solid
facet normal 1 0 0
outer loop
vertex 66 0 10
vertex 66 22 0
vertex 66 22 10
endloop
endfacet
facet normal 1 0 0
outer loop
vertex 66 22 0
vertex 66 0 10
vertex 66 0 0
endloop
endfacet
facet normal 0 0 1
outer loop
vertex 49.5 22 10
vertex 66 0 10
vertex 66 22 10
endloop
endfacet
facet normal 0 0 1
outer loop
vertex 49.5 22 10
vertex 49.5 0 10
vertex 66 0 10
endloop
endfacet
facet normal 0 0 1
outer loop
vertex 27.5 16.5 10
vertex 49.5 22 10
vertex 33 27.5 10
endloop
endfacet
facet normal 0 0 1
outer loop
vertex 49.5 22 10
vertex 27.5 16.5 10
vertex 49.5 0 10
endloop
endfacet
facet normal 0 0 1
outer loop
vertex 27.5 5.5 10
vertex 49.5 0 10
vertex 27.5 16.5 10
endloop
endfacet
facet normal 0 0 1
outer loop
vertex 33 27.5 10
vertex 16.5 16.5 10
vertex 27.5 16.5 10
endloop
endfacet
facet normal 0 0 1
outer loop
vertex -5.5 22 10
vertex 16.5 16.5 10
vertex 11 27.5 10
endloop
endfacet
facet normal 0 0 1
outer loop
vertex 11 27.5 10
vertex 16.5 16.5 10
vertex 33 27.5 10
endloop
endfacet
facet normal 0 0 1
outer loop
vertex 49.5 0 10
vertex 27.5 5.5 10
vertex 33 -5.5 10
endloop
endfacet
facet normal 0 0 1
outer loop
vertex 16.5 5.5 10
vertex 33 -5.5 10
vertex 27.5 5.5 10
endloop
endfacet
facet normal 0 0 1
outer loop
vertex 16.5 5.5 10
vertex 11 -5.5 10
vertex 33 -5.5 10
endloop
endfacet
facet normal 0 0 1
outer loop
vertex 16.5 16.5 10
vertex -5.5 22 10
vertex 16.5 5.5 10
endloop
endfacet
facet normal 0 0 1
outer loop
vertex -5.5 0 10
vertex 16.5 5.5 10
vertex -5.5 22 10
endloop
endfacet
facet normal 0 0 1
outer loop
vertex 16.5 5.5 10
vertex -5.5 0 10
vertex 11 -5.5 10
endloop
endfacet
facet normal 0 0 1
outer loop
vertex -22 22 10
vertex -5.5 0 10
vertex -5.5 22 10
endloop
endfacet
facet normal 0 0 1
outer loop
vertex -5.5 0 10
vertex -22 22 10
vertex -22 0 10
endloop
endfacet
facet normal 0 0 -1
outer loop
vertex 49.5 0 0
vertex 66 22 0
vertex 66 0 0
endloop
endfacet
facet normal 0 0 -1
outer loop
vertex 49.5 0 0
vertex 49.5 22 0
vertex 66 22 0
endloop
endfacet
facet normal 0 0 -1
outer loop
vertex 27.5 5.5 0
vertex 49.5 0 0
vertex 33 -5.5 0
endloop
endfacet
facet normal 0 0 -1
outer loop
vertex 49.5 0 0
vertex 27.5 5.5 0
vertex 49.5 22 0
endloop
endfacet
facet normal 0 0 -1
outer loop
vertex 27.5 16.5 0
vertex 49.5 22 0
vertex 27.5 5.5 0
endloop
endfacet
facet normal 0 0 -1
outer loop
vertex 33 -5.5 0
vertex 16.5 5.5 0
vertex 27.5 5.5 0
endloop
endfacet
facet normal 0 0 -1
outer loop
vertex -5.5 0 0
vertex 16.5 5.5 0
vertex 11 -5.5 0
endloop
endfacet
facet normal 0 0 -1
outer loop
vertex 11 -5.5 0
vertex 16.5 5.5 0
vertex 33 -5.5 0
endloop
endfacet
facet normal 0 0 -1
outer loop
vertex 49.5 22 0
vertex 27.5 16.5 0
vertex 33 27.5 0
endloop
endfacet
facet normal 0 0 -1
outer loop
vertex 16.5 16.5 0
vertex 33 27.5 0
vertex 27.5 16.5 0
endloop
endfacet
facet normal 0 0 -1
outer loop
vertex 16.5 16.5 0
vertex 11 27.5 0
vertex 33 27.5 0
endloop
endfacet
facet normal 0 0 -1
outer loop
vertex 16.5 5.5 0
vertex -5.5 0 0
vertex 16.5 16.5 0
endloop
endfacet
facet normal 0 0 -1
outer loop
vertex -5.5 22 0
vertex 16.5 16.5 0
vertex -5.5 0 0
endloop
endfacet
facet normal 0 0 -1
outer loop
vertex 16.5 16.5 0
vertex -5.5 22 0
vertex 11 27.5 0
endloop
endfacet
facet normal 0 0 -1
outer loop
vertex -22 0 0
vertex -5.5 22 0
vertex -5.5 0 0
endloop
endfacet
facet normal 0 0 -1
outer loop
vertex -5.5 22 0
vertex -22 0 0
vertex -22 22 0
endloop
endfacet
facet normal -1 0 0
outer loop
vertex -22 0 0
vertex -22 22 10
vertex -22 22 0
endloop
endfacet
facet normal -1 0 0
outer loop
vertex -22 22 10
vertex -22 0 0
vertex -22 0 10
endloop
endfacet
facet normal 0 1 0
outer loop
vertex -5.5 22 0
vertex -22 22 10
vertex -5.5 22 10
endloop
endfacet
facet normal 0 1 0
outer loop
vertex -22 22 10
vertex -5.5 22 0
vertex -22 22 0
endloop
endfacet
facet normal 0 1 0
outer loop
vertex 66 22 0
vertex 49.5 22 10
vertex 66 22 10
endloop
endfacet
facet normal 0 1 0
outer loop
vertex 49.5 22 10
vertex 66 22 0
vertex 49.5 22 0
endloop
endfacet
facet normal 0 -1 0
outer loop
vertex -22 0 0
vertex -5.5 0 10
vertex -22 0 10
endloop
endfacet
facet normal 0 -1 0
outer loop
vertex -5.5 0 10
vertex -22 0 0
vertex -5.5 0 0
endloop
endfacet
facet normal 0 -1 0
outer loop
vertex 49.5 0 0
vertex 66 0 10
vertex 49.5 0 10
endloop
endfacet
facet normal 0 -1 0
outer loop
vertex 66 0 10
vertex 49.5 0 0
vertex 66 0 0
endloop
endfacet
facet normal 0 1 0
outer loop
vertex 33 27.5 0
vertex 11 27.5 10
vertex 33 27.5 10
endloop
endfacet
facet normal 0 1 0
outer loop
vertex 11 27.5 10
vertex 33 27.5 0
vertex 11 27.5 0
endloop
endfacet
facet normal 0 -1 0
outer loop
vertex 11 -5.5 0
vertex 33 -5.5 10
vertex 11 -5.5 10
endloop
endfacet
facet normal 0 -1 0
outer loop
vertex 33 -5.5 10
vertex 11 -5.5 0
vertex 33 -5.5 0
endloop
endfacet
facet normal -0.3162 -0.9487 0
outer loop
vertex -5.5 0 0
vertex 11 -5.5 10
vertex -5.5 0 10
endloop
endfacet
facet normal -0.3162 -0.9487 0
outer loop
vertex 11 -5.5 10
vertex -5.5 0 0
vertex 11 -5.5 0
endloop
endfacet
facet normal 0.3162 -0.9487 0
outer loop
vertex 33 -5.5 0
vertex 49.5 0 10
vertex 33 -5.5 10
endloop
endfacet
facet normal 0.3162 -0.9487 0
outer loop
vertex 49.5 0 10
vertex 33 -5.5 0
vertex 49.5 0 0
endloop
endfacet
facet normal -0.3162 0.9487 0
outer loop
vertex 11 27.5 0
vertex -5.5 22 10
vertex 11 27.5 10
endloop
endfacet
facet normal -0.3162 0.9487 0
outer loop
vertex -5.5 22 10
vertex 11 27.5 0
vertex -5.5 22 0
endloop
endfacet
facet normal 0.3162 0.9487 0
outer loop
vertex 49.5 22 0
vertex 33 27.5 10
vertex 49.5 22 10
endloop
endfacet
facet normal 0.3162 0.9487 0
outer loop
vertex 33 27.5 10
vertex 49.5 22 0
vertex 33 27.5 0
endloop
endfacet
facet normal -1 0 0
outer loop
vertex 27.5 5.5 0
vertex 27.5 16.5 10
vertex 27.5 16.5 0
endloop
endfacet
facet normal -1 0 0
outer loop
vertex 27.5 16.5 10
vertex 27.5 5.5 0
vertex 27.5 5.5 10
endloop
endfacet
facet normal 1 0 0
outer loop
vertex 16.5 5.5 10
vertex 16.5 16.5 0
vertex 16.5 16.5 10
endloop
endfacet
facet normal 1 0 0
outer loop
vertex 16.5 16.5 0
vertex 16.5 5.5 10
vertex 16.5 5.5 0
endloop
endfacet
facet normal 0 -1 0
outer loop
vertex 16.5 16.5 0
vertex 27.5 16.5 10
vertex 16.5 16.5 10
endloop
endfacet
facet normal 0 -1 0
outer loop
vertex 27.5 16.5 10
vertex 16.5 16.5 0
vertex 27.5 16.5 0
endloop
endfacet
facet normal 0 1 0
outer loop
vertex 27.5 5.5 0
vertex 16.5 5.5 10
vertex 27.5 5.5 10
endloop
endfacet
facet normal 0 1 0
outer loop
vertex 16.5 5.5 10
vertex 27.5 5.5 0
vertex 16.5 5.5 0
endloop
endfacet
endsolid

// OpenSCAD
centralSquare = 11;
longeure=4*centralSquare;
epaisseur=10;
difference ()
{
	union ()
		{  
		translate([-longeure/2,0,0])
		cube([2*longeure,2*centralSquare,epaisseur]);
		translate([longeure/4,-centralSquare/2,0])
		cube([2*centralSquare,3*centralSquare,epaisseur]);	

		linear_extrude (height=epaisseur) polygon (points=[[centralSquare,0],[-centralSquare/2,0],[centralSquare,-centralSquare/2]]);
		linear_extrude (height=epaisseur) polygon (points=[[3*centralSquare,0],[3*centralSquare,-centralSquare/2],[4.5*centralSquare,0 ]]);	
		linear_extrude (height=epaisseur) polygon (points=[[centralSquare,2*centralSquare],[-centralSquare/2,2*centralSquare],[centralSquare,2*centralSquare+centralSquare/2]]);
		linear_extrude (height=epaisseur) polygon (points=[[3*centralSquare,2*centralSquare],[3*centralSquare,2*centralSquare+centralSquare/2],[4.5*centralSquare,2*centralSquare ]]);	
		}
		translate([longeure/2-centralSquare/2,centralSquare/2,-10])
		cube([centralSquare,centralSquare,2*epaisseur+20]);
	}
 
